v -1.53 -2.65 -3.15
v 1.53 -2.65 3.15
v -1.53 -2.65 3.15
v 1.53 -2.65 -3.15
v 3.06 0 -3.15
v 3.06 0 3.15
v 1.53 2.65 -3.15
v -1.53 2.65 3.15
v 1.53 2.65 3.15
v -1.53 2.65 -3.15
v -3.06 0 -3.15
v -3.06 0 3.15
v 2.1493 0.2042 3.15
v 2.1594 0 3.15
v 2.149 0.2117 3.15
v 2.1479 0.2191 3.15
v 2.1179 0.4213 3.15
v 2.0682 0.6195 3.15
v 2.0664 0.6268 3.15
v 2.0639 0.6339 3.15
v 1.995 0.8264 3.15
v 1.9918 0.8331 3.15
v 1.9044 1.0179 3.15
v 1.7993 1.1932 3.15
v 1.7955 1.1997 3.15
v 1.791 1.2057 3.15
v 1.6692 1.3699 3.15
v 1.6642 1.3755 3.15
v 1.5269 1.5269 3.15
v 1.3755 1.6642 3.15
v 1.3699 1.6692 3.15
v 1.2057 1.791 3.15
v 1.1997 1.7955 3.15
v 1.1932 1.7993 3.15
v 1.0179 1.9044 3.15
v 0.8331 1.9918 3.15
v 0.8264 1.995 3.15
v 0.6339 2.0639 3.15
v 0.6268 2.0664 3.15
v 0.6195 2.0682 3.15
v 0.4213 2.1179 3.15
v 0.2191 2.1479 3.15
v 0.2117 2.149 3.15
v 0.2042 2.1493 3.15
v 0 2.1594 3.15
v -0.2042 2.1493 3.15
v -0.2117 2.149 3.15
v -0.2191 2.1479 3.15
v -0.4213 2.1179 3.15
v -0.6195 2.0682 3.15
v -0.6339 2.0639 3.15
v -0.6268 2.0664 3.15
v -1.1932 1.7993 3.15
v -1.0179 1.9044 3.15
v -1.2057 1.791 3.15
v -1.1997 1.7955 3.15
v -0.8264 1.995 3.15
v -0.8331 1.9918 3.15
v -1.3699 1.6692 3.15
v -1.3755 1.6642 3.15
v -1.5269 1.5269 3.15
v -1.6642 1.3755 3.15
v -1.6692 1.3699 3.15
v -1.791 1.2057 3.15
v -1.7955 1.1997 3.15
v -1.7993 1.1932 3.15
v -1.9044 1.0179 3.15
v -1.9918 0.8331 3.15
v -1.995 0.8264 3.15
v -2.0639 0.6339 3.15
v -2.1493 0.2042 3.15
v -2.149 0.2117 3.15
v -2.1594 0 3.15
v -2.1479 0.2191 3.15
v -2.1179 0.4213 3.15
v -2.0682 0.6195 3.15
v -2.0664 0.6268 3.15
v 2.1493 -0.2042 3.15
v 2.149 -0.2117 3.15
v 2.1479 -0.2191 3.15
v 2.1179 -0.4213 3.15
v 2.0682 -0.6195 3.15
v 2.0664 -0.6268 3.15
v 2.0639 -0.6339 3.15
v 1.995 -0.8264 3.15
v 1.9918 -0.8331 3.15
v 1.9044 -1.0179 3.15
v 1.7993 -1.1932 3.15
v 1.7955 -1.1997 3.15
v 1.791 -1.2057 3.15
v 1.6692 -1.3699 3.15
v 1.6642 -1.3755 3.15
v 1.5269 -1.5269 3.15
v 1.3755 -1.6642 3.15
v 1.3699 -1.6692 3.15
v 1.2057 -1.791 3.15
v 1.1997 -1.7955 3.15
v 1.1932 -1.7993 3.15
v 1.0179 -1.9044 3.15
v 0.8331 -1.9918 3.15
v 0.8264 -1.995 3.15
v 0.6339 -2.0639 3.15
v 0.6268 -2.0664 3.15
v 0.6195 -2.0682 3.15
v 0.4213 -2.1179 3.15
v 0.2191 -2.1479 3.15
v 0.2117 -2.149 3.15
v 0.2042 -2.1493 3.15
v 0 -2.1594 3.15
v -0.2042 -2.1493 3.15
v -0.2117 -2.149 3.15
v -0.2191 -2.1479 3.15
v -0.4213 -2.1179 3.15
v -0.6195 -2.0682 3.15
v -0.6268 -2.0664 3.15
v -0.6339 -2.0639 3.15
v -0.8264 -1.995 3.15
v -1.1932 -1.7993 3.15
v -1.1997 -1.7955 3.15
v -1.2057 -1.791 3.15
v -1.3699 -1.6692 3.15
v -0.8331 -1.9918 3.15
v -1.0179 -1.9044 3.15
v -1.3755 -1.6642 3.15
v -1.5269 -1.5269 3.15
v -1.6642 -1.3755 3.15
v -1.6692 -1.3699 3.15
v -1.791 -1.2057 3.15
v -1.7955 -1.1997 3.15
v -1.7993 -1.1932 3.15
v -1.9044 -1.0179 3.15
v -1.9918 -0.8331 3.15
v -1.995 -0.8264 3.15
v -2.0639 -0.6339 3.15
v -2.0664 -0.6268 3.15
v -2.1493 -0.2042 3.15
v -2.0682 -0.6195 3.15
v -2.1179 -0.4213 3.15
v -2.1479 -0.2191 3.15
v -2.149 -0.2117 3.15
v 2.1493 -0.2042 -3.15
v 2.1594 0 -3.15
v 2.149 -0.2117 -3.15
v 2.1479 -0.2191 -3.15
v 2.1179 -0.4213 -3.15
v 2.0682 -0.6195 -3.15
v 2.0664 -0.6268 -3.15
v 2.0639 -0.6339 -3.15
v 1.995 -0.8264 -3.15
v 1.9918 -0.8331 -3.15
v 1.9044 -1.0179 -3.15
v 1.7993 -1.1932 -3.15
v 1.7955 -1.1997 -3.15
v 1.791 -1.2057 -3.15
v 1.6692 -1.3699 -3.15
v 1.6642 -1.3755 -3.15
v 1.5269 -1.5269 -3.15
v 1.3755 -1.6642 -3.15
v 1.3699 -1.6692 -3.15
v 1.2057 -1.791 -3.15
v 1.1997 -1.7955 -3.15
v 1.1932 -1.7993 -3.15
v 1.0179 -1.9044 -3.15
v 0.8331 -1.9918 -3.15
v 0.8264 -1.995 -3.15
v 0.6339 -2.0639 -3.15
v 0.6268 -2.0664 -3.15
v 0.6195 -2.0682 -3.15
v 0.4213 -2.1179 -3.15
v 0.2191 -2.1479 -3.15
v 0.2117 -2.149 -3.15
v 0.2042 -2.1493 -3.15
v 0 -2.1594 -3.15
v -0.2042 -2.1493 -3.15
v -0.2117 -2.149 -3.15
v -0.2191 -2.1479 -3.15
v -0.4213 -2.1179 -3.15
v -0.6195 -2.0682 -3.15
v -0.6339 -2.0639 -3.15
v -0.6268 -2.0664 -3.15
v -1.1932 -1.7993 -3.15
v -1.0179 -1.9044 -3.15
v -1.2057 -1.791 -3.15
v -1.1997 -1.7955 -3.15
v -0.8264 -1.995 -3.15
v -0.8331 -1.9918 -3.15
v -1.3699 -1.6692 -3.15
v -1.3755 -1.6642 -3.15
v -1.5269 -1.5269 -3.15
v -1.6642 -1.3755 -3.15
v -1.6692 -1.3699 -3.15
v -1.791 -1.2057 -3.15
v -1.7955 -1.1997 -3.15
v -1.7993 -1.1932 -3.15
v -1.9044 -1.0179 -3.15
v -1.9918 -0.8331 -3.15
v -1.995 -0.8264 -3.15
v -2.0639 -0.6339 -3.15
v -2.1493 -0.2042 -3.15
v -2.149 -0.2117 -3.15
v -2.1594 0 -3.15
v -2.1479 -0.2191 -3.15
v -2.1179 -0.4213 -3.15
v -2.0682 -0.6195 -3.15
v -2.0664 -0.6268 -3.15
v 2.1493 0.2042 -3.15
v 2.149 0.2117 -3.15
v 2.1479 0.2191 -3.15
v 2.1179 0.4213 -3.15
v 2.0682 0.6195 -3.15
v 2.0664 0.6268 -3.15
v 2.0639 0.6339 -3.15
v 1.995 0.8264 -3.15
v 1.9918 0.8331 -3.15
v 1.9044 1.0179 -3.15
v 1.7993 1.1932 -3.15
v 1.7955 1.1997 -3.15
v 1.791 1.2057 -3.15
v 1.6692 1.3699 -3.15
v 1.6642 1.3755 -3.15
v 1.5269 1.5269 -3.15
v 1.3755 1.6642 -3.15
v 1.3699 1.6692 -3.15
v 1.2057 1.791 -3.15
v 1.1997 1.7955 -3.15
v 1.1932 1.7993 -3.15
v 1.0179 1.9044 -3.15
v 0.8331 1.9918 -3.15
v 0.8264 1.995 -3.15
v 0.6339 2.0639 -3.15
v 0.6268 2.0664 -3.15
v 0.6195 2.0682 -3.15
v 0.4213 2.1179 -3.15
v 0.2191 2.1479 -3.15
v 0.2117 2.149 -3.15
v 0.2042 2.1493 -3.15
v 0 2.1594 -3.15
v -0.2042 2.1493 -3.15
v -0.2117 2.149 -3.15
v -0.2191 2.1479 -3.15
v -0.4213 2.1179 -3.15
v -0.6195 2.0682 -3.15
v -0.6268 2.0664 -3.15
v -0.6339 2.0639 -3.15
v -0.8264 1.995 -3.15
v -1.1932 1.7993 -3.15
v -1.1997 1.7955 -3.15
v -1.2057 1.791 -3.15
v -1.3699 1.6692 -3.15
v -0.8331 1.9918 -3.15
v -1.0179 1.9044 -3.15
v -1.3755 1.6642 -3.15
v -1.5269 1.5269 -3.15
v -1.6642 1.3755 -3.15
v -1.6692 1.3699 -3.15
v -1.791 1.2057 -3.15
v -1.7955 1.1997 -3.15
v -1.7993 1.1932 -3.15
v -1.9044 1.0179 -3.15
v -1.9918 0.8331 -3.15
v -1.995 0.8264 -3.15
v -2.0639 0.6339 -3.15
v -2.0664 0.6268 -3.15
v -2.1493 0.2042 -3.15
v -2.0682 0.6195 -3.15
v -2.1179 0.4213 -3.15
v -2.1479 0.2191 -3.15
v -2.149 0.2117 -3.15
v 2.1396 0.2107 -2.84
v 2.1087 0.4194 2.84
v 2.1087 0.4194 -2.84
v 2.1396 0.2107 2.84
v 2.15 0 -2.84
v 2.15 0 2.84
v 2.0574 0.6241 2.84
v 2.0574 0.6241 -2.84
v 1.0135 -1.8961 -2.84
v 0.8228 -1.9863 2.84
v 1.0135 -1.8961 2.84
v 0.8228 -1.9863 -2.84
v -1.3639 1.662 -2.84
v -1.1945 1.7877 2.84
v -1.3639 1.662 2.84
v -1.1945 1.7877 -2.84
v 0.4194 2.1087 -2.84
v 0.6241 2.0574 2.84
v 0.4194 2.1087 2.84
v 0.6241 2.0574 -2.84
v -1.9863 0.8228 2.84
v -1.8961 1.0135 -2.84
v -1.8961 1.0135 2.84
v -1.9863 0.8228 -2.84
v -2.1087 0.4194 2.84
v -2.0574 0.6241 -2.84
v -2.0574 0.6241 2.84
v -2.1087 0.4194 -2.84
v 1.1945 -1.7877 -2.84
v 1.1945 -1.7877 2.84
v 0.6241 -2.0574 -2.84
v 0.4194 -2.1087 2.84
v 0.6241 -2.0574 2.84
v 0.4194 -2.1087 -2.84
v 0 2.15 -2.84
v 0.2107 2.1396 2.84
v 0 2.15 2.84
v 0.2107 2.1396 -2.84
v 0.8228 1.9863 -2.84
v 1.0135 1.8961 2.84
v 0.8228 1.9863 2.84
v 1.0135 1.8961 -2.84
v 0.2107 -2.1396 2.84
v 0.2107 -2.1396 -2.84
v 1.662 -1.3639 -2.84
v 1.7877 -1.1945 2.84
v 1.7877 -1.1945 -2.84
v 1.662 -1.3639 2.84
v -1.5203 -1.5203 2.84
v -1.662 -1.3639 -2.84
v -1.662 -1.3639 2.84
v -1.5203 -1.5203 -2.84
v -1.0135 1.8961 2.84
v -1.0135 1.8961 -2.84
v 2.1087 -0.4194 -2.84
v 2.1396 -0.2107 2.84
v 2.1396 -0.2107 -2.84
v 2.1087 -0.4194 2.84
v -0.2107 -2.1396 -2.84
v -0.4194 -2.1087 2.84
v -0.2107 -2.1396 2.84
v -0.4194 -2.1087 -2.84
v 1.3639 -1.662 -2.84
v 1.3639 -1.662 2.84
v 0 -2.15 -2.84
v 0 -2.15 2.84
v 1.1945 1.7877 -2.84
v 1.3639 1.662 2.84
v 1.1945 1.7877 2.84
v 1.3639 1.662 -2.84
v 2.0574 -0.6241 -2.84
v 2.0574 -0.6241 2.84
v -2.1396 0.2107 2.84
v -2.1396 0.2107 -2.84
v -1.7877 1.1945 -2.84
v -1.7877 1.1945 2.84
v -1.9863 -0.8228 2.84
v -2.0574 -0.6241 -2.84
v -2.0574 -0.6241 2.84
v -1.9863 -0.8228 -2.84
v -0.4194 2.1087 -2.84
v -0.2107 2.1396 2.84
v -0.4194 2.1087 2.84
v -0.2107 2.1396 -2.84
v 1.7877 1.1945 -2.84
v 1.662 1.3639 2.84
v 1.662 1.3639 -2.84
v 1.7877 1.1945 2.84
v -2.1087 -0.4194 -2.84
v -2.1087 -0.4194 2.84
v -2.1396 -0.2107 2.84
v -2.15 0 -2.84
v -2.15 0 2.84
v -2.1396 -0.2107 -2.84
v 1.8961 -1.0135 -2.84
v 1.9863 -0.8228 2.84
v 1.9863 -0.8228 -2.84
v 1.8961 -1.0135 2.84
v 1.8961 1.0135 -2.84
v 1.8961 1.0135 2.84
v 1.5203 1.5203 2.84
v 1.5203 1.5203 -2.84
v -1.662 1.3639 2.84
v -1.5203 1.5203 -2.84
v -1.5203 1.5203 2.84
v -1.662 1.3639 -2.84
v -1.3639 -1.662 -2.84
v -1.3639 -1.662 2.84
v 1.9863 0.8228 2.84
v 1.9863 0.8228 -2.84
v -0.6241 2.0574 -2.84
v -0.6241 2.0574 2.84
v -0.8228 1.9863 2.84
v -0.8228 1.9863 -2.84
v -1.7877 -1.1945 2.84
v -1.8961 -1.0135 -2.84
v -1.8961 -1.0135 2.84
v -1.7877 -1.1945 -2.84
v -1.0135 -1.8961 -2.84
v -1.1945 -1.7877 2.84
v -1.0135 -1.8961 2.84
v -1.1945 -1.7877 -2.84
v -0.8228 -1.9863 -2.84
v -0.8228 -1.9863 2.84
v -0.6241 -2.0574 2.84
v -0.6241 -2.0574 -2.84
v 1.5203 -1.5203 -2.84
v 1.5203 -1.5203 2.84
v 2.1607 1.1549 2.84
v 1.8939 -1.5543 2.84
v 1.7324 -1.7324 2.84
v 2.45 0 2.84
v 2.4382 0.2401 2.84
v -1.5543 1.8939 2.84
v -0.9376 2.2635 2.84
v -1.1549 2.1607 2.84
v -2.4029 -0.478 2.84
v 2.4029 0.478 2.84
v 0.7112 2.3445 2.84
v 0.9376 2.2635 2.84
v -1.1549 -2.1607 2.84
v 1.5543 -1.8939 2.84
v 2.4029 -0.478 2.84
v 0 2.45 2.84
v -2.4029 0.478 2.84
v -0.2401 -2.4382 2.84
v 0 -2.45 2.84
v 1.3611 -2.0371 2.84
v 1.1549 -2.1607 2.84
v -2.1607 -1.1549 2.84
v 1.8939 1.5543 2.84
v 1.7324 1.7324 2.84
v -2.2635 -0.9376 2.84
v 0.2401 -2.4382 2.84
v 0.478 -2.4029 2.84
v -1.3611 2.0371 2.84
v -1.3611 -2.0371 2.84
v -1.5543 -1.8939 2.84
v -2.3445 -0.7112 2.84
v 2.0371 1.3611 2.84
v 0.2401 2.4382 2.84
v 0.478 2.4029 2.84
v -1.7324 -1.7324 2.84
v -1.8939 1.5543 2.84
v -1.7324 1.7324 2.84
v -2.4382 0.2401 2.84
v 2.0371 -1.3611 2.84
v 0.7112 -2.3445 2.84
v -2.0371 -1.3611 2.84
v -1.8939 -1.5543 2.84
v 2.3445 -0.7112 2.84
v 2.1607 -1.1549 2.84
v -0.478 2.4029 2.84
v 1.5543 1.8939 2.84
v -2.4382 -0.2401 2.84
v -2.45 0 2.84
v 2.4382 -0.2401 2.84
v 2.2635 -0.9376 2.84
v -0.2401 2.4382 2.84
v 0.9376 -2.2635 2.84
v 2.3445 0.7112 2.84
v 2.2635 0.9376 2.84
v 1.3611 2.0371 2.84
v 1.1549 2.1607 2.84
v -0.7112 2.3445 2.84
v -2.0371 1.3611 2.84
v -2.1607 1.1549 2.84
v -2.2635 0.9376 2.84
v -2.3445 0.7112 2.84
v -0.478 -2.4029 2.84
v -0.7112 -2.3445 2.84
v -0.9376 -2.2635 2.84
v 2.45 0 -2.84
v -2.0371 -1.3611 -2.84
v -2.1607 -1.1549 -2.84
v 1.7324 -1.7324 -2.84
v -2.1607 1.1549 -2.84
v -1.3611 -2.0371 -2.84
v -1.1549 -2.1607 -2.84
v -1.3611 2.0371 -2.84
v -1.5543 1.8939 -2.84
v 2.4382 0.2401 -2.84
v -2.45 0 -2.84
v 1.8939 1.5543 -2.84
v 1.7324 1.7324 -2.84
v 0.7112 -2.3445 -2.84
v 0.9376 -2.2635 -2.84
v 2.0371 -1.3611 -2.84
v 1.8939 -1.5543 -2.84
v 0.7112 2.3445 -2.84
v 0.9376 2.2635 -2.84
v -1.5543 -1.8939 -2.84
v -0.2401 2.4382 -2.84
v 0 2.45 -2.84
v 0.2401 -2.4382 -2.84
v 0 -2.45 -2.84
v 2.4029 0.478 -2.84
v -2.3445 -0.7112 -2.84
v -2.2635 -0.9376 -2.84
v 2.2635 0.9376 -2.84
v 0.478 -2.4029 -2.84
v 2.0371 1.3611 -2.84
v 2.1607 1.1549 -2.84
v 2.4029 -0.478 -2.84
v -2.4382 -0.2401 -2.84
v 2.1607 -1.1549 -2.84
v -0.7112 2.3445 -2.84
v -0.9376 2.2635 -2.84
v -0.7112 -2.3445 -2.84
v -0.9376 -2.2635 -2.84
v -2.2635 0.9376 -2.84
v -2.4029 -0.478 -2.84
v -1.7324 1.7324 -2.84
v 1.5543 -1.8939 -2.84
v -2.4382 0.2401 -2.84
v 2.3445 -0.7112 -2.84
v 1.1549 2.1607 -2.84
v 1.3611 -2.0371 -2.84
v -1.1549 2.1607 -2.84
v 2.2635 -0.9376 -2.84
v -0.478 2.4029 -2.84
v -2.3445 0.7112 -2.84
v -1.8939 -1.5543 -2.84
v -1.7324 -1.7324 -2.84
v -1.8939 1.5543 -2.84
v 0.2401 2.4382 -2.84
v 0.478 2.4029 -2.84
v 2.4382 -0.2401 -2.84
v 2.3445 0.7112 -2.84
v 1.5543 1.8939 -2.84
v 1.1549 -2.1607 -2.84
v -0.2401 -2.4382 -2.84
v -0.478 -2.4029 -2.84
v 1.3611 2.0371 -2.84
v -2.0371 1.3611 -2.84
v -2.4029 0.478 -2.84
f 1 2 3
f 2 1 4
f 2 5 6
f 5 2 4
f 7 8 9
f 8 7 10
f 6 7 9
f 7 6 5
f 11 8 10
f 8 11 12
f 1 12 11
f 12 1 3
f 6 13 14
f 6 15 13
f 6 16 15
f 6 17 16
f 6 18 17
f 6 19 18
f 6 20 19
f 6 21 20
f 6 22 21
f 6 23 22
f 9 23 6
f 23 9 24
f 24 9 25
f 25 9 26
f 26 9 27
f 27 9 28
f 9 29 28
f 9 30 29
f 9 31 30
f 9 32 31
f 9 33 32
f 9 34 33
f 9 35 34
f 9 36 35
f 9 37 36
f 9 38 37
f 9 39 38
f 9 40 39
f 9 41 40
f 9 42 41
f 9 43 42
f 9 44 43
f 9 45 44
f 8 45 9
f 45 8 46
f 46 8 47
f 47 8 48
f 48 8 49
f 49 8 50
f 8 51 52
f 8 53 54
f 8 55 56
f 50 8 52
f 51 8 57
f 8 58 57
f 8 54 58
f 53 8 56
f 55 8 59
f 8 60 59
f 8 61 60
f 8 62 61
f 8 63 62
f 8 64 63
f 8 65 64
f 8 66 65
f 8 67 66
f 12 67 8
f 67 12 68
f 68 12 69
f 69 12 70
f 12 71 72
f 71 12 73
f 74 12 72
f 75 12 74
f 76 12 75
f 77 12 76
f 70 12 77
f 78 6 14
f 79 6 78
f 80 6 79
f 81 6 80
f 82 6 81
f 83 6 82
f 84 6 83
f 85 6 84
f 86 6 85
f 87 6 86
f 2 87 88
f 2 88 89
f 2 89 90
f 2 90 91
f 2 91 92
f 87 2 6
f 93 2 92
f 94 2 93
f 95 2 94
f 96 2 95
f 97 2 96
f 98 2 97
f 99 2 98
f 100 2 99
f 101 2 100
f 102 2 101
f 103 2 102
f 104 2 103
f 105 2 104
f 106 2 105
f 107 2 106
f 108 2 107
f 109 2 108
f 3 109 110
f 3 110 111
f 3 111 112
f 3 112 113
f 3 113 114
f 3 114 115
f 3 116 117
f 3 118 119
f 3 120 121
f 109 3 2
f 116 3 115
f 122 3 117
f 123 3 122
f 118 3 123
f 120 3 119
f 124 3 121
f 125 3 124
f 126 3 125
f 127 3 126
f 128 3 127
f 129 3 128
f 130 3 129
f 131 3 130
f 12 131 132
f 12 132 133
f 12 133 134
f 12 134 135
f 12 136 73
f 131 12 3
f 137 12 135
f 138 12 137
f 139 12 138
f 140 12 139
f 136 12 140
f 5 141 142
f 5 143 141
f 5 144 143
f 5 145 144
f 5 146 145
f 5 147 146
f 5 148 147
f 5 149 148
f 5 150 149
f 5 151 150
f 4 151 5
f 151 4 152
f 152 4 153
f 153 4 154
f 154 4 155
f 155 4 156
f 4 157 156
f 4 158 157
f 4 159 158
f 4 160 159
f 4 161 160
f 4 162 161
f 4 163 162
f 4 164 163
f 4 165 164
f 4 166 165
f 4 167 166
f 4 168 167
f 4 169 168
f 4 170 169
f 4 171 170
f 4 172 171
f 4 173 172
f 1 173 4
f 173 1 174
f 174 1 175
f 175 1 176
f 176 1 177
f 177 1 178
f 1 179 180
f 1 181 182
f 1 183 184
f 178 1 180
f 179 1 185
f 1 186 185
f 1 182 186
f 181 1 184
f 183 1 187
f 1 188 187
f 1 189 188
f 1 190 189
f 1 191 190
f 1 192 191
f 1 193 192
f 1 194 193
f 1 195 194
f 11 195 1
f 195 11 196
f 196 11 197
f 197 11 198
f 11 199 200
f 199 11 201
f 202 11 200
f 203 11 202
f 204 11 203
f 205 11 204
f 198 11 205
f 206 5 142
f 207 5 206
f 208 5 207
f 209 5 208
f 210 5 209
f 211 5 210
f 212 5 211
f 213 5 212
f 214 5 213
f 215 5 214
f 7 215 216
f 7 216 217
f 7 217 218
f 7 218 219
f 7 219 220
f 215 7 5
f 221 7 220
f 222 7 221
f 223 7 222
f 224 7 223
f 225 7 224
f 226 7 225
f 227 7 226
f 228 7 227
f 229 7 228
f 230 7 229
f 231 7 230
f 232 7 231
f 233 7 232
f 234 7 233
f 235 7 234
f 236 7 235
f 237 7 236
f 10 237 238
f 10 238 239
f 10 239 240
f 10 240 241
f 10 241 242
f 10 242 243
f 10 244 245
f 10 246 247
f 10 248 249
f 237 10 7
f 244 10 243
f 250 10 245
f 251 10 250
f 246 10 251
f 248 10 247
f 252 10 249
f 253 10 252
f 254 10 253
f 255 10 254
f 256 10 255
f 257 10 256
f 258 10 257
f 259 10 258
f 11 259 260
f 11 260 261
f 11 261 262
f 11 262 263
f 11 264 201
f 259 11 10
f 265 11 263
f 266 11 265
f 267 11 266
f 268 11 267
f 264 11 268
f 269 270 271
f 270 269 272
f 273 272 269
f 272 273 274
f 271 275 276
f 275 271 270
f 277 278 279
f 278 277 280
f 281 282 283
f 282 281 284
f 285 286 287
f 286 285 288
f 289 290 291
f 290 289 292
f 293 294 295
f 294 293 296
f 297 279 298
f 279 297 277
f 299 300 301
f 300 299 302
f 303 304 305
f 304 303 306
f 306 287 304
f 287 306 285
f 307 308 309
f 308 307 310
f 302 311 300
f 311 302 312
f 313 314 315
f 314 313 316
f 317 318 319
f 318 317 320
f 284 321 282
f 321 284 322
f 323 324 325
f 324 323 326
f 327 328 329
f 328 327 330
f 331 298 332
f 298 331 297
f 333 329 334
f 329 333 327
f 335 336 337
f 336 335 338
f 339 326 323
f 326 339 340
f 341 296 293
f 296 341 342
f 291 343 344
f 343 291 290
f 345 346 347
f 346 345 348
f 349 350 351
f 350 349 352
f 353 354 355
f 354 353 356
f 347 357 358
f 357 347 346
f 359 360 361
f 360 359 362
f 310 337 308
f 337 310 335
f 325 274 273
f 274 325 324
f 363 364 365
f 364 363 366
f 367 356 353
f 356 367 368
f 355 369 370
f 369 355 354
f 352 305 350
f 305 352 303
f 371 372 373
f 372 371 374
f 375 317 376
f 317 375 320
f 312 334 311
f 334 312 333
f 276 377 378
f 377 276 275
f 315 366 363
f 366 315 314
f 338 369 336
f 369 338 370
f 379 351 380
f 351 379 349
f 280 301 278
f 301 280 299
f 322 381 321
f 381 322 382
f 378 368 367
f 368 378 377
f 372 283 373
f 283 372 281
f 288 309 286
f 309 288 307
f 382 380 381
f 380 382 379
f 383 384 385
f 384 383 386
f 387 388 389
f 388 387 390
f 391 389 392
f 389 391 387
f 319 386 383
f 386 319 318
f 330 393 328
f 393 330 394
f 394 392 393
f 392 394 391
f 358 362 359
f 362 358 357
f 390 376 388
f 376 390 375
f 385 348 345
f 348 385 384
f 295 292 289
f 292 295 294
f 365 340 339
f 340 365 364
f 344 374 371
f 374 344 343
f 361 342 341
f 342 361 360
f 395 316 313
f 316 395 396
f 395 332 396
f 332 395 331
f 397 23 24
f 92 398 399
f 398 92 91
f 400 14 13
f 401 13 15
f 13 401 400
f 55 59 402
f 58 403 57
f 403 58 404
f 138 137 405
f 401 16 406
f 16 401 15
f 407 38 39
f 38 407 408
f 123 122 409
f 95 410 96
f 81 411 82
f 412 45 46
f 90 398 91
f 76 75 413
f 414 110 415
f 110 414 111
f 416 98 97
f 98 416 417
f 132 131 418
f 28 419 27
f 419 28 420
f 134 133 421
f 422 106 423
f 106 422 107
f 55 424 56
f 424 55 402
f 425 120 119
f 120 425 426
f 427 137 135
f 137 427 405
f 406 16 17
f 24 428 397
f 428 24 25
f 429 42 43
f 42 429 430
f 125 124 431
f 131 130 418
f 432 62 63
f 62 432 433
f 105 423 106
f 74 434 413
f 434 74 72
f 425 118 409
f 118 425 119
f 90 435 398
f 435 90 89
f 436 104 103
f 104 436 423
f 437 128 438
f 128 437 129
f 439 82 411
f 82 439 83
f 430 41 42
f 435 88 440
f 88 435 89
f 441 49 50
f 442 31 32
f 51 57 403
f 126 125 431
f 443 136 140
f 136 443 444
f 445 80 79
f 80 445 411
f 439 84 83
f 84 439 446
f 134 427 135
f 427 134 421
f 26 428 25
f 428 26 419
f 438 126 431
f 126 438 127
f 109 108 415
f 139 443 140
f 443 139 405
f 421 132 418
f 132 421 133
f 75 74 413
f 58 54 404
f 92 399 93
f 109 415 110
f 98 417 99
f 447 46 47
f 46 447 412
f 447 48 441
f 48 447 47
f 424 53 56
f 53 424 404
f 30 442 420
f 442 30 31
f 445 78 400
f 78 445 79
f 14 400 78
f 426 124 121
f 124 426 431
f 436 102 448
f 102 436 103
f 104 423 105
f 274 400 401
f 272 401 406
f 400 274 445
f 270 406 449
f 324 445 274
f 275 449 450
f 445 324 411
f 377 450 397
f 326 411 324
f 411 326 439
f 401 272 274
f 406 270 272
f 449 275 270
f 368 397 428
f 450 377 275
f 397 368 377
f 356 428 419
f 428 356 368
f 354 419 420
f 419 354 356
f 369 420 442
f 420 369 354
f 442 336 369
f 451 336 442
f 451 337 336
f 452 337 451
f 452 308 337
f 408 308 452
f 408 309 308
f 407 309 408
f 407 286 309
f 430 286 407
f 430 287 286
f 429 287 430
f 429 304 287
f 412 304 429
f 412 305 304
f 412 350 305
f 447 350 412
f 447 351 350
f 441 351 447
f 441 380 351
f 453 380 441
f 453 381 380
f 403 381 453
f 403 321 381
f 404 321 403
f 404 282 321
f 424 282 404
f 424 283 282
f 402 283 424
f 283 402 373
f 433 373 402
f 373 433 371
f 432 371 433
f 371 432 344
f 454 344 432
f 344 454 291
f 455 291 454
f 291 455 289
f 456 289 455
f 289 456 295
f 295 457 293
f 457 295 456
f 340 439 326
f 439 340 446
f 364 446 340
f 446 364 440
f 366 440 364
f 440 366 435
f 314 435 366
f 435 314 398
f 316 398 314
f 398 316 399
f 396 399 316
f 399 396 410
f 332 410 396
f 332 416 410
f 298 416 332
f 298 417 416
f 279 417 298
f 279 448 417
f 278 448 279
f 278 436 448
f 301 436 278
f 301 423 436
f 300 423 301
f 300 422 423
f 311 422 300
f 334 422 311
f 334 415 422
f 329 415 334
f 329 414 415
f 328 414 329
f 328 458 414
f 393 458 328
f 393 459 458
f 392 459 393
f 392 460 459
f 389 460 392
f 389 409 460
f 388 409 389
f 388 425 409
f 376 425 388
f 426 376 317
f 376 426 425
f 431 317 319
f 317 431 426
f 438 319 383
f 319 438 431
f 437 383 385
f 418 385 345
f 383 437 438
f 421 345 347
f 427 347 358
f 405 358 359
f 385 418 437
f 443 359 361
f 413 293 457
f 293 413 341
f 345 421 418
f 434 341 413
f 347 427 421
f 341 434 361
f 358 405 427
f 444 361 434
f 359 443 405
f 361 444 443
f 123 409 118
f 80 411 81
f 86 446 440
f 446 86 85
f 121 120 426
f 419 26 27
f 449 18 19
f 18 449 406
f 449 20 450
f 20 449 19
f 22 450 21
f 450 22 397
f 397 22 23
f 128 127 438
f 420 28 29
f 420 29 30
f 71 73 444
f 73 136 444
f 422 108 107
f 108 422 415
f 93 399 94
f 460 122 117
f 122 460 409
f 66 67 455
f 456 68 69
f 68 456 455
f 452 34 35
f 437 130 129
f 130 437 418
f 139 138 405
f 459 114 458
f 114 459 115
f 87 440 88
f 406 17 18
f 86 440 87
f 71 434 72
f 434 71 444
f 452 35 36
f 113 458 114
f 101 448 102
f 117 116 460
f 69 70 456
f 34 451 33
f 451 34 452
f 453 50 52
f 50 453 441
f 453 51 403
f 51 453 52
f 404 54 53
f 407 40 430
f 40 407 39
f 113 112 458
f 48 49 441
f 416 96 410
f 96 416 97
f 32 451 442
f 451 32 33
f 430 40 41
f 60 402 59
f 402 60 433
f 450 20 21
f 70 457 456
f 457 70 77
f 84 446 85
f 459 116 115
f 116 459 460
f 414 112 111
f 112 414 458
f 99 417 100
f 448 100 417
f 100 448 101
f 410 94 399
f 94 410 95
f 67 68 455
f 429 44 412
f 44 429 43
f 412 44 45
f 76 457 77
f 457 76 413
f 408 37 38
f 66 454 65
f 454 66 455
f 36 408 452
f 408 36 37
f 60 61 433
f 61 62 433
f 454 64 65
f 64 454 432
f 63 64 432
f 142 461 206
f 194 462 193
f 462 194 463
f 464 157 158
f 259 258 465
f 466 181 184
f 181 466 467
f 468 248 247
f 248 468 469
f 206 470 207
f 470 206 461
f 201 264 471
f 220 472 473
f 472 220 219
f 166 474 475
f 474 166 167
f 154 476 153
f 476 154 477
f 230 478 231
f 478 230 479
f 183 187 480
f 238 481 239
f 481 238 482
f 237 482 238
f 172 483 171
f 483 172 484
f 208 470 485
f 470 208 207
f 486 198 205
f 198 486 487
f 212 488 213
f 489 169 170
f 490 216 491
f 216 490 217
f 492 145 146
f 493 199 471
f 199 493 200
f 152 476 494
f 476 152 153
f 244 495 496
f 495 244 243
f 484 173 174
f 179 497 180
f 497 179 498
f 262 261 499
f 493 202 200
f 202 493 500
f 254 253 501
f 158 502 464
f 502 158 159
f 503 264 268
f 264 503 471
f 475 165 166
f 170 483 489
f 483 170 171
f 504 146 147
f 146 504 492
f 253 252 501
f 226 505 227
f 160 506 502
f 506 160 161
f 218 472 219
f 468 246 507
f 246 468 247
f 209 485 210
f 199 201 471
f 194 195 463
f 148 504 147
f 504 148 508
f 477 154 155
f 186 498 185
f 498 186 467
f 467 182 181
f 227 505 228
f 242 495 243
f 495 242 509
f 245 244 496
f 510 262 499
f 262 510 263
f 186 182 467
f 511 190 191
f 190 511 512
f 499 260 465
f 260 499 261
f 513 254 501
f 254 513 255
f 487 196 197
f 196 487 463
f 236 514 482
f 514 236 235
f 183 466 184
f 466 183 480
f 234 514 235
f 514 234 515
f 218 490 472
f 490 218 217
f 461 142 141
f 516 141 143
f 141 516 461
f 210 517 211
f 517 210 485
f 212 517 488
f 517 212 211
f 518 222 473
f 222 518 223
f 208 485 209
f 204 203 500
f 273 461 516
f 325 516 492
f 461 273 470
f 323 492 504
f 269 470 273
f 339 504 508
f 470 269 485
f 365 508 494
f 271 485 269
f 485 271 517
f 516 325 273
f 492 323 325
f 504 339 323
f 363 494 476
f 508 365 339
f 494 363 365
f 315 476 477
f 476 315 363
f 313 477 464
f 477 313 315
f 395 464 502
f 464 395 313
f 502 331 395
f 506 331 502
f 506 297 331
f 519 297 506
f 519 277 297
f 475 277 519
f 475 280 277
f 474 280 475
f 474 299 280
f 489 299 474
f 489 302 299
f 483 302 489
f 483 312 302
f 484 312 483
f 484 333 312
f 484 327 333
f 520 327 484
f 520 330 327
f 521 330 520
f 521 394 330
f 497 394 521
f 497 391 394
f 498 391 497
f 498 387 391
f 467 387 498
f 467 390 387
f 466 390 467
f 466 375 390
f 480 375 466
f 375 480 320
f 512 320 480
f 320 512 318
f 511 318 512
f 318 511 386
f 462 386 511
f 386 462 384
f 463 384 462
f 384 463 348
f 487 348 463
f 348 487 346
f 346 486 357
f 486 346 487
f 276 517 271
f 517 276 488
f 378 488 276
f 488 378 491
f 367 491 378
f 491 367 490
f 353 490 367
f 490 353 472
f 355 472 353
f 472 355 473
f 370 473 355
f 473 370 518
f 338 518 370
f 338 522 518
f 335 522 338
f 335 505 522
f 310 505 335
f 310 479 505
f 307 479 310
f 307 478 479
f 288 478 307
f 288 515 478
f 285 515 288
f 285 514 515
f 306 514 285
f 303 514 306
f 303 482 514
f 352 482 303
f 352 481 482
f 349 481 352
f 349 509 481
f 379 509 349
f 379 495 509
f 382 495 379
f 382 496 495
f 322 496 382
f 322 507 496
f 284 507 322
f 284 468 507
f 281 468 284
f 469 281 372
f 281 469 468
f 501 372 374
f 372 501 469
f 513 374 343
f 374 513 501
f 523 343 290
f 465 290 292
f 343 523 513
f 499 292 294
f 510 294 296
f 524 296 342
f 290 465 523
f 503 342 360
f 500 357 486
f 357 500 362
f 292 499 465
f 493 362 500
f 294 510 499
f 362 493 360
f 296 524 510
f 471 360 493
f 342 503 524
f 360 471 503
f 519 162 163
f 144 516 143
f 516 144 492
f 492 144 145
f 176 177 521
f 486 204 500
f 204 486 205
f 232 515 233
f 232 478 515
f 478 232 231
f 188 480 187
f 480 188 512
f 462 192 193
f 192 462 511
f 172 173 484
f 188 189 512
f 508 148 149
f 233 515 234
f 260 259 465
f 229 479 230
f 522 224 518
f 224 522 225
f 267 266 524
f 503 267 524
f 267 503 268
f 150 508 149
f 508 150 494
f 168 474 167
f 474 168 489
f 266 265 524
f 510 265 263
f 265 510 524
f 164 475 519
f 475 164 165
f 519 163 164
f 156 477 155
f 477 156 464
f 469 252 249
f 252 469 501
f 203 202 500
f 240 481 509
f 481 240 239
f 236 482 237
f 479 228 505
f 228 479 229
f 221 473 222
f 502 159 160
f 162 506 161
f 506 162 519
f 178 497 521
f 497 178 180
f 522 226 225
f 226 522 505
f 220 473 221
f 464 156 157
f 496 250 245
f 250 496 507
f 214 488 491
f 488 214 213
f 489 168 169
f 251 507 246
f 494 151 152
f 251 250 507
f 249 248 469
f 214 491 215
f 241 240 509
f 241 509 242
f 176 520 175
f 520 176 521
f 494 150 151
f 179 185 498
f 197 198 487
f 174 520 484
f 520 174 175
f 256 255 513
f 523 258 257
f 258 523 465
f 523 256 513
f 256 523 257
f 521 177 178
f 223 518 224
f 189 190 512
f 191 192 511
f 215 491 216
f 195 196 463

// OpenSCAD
// Hex nut for 4.0mm screw, 5.3mm across flats, 6.3mm thick

thread_diameter_mm = 4.0;                 // screw nominal
across_flats_mm = 5.3;                    // required AF
thickness_mm = 6.3;                       // required thickness
clearance_hole_diameter_mm = 4.3;         // through-hole clearance
chamfer_mm = 0.3;                         // small entry chamfer
eps_mm = 0.02;                            // numerical robustness

// Derived: circumradius for a hex with given across-flats
hex_R = across_flats_mm / sqrt(3);        // AF = sqrt(3)*R

module hex_nut() {
    difference() {
        // Outer hex body (single solid)
        cylinder(h = thickness_mm, r = hex_R, $fn = 6, center = true);

        // Through-hole
        cylinder(h = thickness_mm + 2*eps_mm, r = clearance_hole_diameter_mm/2, $fn = 64, center = true);

        // Top chamfer (countersink-like)
        translate([0, 0, thickness_mm/2 - chamfer_mm/2])
            cylinder(h = chamfer_mm + eps_mm,
                     r1 = clearance_hole_diameter_mm/2 + chamfer_mm,
                     r2 = clearance_hole_diameter_mm/2,
                     $fn = 64, center = true);

        // Bottom chamfer
        translate([0, 0, -thickness_mm/2 + chamfer_mm/2])
            cylinder(h = chamfer_mm + eps_mm,
                     r1 = clearance_hole_diameter_mm/2,
                     r2 = clearance_hole_diameter_mm/2 + chamfer_mm,
                     $fn = 64, center = true);
    }
}

hex_nut();
